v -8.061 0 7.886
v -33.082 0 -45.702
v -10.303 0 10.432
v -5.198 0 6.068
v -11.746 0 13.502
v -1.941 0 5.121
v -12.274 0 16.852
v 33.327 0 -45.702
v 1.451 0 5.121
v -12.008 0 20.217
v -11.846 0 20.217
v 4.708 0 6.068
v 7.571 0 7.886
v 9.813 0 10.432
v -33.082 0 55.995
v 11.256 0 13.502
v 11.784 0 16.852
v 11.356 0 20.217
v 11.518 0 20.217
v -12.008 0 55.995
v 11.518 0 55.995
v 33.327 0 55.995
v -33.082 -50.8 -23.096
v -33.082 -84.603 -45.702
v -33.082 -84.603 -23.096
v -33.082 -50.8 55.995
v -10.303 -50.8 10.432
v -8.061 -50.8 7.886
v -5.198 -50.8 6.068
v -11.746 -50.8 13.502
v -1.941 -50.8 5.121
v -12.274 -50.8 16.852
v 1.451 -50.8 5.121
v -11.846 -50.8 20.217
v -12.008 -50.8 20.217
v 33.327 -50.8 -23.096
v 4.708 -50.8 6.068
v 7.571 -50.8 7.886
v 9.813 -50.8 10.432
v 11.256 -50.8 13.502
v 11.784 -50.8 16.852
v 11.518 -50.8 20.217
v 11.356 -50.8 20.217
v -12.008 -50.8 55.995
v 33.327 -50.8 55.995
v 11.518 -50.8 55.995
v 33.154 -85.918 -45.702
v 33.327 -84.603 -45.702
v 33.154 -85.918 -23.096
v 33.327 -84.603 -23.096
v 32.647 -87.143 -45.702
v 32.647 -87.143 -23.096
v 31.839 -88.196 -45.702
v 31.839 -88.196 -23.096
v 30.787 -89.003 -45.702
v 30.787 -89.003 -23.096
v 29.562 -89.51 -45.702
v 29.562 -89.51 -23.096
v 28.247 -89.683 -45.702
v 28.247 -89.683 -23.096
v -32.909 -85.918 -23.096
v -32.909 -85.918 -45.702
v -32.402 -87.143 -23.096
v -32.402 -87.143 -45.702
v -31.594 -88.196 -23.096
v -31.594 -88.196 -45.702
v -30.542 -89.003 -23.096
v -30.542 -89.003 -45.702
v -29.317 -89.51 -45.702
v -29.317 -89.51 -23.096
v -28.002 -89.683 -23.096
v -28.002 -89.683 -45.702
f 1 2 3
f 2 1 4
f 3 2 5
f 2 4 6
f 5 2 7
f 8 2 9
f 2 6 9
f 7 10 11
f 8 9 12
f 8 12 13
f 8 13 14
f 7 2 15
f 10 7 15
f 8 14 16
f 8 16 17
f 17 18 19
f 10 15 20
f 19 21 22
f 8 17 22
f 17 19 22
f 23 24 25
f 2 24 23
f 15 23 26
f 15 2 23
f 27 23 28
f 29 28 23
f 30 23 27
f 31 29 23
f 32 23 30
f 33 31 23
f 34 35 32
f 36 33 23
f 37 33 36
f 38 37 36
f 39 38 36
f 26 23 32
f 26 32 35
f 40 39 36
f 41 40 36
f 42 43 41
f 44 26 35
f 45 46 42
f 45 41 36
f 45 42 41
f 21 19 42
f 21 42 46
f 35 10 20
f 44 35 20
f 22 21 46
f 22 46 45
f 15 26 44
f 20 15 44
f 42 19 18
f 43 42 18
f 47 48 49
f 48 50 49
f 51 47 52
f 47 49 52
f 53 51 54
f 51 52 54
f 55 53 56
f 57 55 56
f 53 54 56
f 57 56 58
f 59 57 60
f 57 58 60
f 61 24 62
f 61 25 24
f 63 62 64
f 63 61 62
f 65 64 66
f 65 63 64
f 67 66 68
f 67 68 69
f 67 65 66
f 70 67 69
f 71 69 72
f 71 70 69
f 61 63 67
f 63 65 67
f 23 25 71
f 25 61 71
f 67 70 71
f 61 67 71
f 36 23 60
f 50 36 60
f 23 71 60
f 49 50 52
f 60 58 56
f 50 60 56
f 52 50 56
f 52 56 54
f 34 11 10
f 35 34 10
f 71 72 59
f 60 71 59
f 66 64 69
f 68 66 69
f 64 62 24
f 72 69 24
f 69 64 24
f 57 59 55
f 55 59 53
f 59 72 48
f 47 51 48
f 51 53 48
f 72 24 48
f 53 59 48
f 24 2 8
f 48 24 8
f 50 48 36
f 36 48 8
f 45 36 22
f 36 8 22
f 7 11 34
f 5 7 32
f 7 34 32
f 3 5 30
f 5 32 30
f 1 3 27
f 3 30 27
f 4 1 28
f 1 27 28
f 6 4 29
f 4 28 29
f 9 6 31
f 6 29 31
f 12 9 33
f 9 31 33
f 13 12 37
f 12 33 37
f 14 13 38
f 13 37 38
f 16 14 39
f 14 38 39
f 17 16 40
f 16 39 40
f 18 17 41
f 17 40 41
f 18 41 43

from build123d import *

# Parameters (mm, degrees)
F0_W     = 66.409525
F0_H     = 101.697244
F1_DEPTH = 50.8
F2_W     = 23.525144
F2_H     = 35.777826
F3_DEPTH = 78.232
F4_R     = 12.030111
F5_DEPTH = 92.202
F6_W     = 66.409525
F6_H     = 38.883481
F7_DEPTH = 22.606
F8_R     = 5.08


with BuildPart() as f1:
    # F0 (on Front) → F1 (new body)
    with BuildSketch(Plane.XZ):
        with Locations((0.122526, 5.146127)):
            Rectangle(F0_W, F0_H)
    extrude(amount=F1_DEPTH)

    # F2 (on face) → F3 (cut)
    with BuildSketch(Plane(origin=(0, 0, 0), x_dir=(-1, 0, 0), z_dir=(0, 1, 0))):
        with Locations((0.245053, 38.105836)):
            Rectangle(F2_W, F2_H)
    extrude(amount=-F3_DEPTH, mode=Mode.SUBTRACT)

    # F4 (on face) → F5 (cut)
    with BuildSketch(Plane.XZ.offset(50.8)):
        with Locations((-0.245053, 17.031224)):
            Circle(F4_R)
    extrude(amount=-F5_DEPTH, mode=Mode.SUBTRACT)

    # F6 (on face) → F7 (join)
    with BuildSketch(Plane(origin=(0, 0, -45.702495), x_dir=(1, 0, 0), z_dir=(0, 0, -1))):
        with Locations((0.122526, 70.24174)):
            Rectangle(F6_W, F6_H)
    extrude(amount=-F7_DEPTH)

    # F8
    f8_edges = [f1.edges().sort_by_distance(p)[0] for p in [
        (33.327289, -89.683481, -34.399495),
        (-33.082236, -89.683481, -34.399495),
    ]]
    fillet(f8_edges, radius=F8_R)


solid = f1.part
